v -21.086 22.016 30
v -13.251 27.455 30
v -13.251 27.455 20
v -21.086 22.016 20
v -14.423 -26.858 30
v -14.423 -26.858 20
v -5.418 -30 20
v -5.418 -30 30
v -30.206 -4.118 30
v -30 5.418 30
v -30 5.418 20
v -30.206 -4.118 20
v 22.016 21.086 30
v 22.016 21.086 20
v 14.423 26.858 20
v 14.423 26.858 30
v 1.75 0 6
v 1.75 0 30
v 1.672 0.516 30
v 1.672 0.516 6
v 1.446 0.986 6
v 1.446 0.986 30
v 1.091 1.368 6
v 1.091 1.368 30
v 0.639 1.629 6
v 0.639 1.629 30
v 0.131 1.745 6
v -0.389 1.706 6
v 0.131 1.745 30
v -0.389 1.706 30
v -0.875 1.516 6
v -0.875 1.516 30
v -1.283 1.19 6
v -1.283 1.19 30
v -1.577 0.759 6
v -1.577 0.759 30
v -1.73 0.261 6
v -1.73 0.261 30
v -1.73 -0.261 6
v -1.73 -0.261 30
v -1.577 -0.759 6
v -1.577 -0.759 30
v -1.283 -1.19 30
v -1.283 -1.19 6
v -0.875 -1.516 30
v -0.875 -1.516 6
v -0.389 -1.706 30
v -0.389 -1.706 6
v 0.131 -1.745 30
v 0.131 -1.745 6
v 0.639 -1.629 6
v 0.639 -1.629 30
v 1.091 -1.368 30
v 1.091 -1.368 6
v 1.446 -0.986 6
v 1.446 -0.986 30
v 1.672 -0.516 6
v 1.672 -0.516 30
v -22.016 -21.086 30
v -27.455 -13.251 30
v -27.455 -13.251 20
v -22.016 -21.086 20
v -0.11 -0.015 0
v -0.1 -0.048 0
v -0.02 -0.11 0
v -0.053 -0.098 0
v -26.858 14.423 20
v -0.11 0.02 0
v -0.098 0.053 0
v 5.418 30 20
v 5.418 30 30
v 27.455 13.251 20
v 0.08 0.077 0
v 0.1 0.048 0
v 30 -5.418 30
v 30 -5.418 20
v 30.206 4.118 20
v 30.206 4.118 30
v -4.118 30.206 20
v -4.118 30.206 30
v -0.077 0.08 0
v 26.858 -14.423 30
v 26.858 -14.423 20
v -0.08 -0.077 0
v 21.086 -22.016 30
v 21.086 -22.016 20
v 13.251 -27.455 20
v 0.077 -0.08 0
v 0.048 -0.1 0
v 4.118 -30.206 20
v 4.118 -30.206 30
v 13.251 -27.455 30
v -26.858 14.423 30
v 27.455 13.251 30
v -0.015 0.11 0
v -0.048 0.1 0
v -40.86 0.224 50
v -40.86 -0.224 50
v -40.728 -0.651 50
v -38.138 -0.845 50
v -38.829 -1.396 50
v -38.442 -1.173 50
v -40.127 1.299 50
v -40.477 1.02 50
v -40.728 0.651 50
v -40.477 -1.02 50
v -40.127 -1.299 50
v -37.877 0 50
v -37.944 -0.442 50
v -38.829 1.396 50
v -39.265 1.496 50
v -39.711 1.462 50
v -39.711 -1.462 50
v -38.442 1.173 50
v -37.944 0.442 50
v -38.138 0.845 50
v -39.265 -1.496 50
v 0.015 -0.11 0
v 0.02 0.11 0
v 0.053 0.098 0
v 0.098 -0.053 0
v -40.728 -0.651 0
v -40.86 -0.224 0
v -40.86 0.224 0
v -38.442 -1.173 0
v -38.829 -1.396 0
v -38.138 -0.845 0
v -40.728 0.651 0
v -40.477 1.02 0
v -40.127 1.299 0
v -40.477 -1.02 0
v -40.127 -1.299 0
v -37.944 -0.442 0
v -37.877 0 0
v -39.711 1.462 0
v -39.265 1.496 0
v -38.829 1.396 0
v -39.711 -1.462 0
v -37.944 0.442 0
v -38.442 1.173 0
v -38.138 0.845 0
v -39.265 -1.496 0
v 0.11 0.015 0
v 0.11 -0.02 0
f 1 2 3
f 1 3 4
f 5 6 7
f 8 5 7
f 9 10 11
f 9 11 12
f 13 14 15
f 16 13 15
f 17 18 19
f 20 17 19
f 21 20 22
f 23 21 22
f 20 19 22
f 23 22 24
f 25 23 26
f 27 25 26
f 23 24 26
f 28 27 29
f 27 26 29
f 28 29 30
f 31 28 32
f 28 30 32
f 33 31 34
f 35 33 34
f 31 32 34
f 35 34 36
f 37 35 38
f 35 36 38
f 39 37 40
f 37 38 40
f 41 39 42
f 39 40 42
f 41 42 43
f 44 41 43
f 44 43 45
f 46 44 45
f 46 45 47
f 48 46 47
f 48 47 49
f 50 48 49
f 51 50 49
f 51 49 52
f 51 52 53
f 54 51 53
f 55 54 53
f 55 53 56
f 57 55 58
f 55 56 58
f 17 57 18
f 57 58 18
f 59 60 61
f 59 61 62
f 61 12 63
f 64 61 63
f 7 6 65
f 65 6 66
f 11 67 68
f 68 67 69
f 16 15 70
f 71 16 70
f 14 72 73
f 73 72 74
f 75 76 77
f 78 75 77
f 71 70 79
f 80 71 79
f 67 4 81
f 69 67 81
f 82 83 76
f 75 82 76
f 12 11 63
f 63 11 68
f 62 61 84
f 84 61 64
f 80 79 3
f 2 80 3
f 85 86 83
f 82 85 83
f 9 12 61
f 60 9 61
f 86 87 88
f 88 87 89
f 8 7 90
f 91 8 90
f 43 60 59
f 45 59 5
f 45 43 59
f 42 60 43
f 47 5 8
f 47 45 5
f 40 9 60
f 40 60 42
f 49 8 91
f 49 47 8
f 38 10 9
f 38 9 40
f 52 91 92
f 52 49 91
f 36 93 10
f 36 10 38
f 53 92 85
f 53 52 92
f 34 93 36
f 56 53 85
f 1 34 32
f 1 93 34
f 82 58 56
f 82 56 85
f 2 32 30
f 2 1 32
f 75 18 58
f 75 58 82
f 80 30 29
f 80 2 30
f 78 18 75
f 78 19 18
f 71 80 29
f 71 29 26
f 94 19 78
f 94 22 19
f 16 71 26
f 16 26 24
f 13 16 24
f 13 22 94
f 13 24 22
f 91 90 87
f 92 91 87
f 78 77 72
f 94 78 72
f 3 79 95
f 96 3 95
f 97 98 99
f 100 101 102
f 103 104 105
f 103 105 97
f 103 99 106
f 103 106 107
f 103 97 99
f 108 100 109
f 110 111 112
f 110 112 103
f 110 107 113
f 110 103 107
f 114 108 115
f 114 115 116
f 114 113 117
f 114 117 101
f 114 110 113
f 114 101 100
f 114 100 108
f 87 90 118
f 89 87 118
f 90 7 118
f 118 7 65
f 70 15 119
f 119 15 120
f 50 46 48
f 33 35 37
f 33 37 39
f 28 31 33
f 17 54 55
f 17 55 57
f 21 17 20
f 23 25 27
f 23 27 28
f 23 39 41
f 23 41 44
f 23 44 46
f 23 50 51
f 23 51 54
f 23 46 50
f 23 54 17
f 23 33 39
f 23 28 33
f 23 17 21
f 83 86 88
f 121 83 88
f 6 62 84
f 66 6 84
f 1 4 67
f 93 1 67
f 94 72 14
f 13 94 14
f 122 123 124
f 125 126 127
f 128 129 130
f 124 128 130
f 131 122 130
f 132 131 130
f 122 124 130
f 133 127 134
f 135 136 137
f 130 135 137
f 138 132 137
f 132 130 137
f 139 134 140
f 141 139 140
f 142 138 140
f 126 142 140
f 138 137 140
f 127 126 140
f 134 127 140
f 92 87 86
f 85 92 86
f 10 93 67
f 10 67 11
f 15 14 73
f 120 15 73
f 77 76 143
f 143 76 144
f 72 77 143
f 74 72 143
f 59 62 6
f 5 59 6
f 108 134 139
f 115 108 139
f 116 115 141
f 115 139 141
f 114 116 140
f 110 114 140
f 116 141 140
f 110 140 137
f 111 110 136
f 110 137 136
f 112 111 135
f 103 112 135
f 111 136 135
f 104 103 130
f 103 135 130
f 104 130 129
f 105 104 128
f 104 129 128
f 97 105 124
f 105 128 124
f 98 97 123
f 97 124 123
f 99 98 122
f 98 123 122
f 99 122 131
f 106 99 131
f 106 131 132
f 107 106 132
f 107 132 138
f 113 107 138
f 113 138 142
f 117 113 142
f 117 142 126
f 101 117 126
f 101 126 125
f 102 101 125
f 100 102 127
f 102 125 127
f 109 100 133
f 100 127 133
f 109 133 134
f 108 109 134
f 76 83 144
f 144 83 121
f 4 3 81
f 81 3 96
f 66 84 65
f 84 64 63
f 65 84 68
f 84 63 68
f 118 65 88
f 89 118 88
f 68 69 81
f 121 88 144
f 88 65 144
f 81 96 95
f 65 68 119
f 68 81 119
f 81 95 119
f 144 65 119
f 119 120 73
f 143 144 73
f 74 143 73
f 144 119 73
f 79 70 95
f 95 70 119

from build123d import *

# Parameters (mm, degrees)
F1_DEPTH     = 30
F2_T1_DEPTH  = 273.0855354784
F2_T3_DEPTH  = 273.0855354784
F2_T5_DEPTH  = 273.0855354784
F2_T7_DEPTH  = 273.0855354784
F2_T9_DEPTH  = 273.0855354784
F2_T11_DEPTH = 273.0855354784
F2_T13_DEPTH = 273.0855354784
F2_T15_DEPTH = 273.0855354784
F2_T17_DEPTH = 273.0855354784
F2_T19_DEPTH = 273.0855354784
F2_T21_DEPTH = 273.0855354784
F2_T23_DEPTH = 273.0855354784
F2_T25_DEPTH = 273.0855354784
F2_T27_DEPTH = 273.0855354784
F2_T29_DEPTH = 273.0855354784
F2_T31_DEPTH = 273.0855354784
F2_T33_DEPTH = 273.0855354784
F2_T35_DEPTH = 273.0855354784
F2_T37_DEPTH = 273.0855354784
F2_T39_DEPTH = 273.0855354784
F3_R         = 1.75
F4_DEPTH     = 24
F5_R         = 1.5
F6_DEPTH     = 50


# Not quite as in the source:
# - a fillet or chamfer that OpenCascade refuses, or shapes differently, is made with other operations: its cross-section is extruded or revolved along the edge and cut away or added


with BuildPart() as f1:
    # F0 (on Top) → F1 (new body)
    with BuildSketch(Plane.XY):
        Polygon((13.2507014279, -27.4548412117), (21.0861784508, -22.0164137096), (26.8575934109, -14.4228662363), (30, -5.4175081257), (30.2057975669, 4.1181534262), (27.4548412117, 13.2507014279), (22.0164137096, 21.0861784508), (14.4228662363, 26.8575934109), (5.4175081257, 30), (-4.1181534262, 30.2057975669), (-13.2507014279, 27.4548412117), (-21.0861784508, 22.0164137096), (-26.8575934109, 14.4228662363), (-30, 5.4175081257), (-30.2057975669, -4.1181534262), (-27.4548412117, -13.2507014279), (-22.0164137096, -21.0861784508), (-14.4228662363, -26.8575934109), (-5.4175081257, -30), (4.1181534262, -30.2057975669), align=None)
    extrude(amount=F1_DEPTH)

    # F2: chamfer of 30 x 20 on 20 edges, made by hand

    # F2_s2 → F2_t1 (cut)
    with BuildSketch(Plane(origin=(-128.9192417481, 44.9861815336, 0), x_dir=(0, 0, 1), z_dir=(0.944167486, -0.3294658683, 0))):
        Polygon((20, 30.1099085987), (0, 0.1099085987), (0, 30.1099085987), align=None)
    extrude(amount=F2_T1_DEPTH, mode=Mode.SUBTRACT)

    # F2_s4 → F2_t3 (cut)
    with BuildSketch(Plane(origin=(-136.5109795463, 2.9461644886, 0), x_dir=(0, 0, 1), z_dir=(0.9997671924, -0.0215768622, 0))):
        Polygon((20, 30.1099085987), (0, 0.1099085987), (0, 30.1099085987), align=None)
    extrude(amount=F2_T3_DEPTH, mode=Mode.SUBTRACT)

    # F2_s6 → F2_t5 (cut)
    with BuildSketch(Plane(origin=(-130.7400715385, -39.3822436636, 0), x_dir=(0, 0, 1), z_dir=(0.9575027202, 0.2884242374, 0))):
        Polygon((20, 30.1099085987), (0, 0.1099085987), (0, 30.1099085987), align=None)
    extrude(amount=F2_T5_DEPTH, mode=Mode.SUBTRACT)

    # F2_s8 → F2_t7 (cut)
    with BuildSketch(Plane(origin=(-39.3822436636, 130.7400715385, 0), x_dir=(0, 0, 1), z_dir=(0.2884242374, -0.9575027202, 0))):
        Polygon((20, 30.1099085987), (0, 0.1099085987), (0, 30.1099085987), align=None)
    extrude(amount=F2_T7_DEPTH, mode=Mode.SUBTRACT)

    # F2_s10 → F2_t9 (cut)
    with BuildSketch(Plane(origin=(-77.8556434138, 112.171414409, 0), x_dir=(0, 0, 1), z_dir=(0.5701923632, -0.8215112105, 0))):
        Polygon((20, 30.1099085987), (0, 0.1099085987), (0, 30.1099085987), align=None)
    extrude(amount=F2_T9_DEPTH, mode=Mode.SUBTRACT)

    # F2_s12 → F2_t11 (cut)
    with BuildSketch(Plane(origin=(-108.7079903345, 82.6226376928, 0), x_dir=(0, 0, 1), z_dir=(0.7961460877, -0.6051044597, 0))):
        Polygon((20, 30.1099085987), (0, 0.1099085987), (0, 30.1099085987), align=None)
    extrude(amount=F2_T11_DEPTH, mode=Mode.SUBTRACT)

    # F2_s14 → F2_t13 (cut)
    with BuildSketch(Plane(origin=(-112.171414409, -77.8556434138, 0), x_dir=(0, 0, 1), z_dir=(0.8215112105, 0.5701923632, 0))):
        Polygon((20, 30.1099085987), (0, 0.1099085987), (0, 30.1099085987), align=None)
    extrude(amount=F2_T13_DEPTH, mode=Mode.SUBTRACT)

    # F2_s16 → F2_t15 (cut)
    with BuildSketch(Plane(origin=(-82.6226376928, -108.7079903345, 0), x_dir=(0, 0, 1), z_dir=(0.6051044597, 0.7961460877, 0))):
        Polygon((20, 30.1099085987), (0, 0.1099085987), (0, 30.1099085987), align=None)
    extrude(amount=F2_T15_DEPTH, mode=Mode.SUBTRACT)

    # F2_s18 → F2_t17 (cut)
    with BuildSketch(Plane(origin=(-44.9861815336, -128.9192417481, 0), x_dir=(0, 0, 1), z_dir=(0.3294658683, 0.944167486, 0))):
        Polygon((20, 30.1099085987), (0, 0.1099085987), (0, 30.1099085987), align=None)
    extrude(amount=F2_T17_DEPTH, mode=Mode.SUBTRACT)

    # F2_s20 → F2_t19 (cut)
    with BuildSketch(Plane(origin=(-2.9461644886, -136.5109795463, 0), x_dir=(0, 0, 1), z_dir=(0.0215768622, 0.9997671924, 0))):
        Polygon((20, 30.1099085987), (0, 0.1099085987), (0, 30.1099085987), align=None)
    extrude(amount=F2_T19_DEPTH, mode=Mode.SUBTRACT)

    # F2_s22 → F2_t21 (cut)
    with BuildSketch(Plane(origin=(39.3822436636, -130.7400715385, 0), x_dir=(0, 0, 1), z_dir=(-0.2884242374, 0.9575027202, 0))):
        Polygon((20, 30.1099085987), (0, 0.1099085987), (0, 30.1099085987), align=None)
    extrude(amount=F2_T21_DEPTH, mode=Mode.SUBTRACT)

    # F2_s24 → F2_t23 (cut)
    with BuildSketch(Plane(origin=(77.8556434138, -112.171414409, 0), x_dir=(0, 0, 1), z_dir=(-0.5701923632, 0.8215112105, 0))):
        Polygon((20, 30.1099085987), (0, 0.1099085987), (0, 30.1099085987), align=None)
    extrude(amount=F2_T23_DEPTH, mode=Mode.SUBTRACT)

    # F2_s26 → F2_t25 (cut)
    with BuildSketch(Plane(origin=(108.7079903345, -82.6226376928, 0), x_dir=(0, 0, 1), z_dir=(-0.7961460877, 0.6051044597, 0))):
        Polygon((20, 30.1099085987), (0, 0.1099085987), (0, 30.1099085987), align=None)
    extrude(amount=F2_T25_DEPTH, mode=Mode.SUBTRACT)

    # F2_s28 → F2_t27 (cut)
    with BuildSketch(Plane(origin=(128.9192417481, -44.9861815336, 0), x_dir=(0, 0, 1), z_dir=(-0.944167486, 0.3294658683, 0))):
        Polygon((20, 30.1099085987), (0, 0.1099085987), (0, 30.1099085987), align=None)
    extrude(amount=F2_T27_DEPTH, mode=Mode.SUBTRACT)

    # F2_s30 → F2_t29 (cut)
    with BuildSketch(Plane(origin=(136.5109795463, -2.9461644886, 0), x_dir=(0, 0, 1), z_dir=(-0.9997671924, 0.0215768622, 0))):
        Polygon((20, 30.1099085987), (0, 0.1099085987), (0, 30.1099085987), align=None)
    extrude(amount=F2_T29_DEPTH, mode=Mode.SUBTRACT)

    # F2_s32 → F2_t31 (cut)
    with BuildSketch(Plane(origin=(130.7400715385, 39.3822436636, 0), x_dir=(0, 0, 1), z_dir=(-0.9575027202, -0.2884242374, 0))):
        Polygon((20, 30.1099085987), (0, 0.1099085987), (0, 30.1099085987), align=None)
    extrude(amount=F2_T31_DEPTH, mode=Mode.SUBTRACT)

    # F2_s34 → F2_t33 (cut)
    with BuildSketch(Plane(origin=(112.171414409, 77.8556434138, 0), x_dir=(0, 0, 1), z_dir=(-0.8215112105, -0.5701923632, 0))):
        Polygon((20, 30.1099085987), (0, 0.1099085987), (0, 30.1099085987), align=None)
    extrude(amount=F2_T33_DEPTH, mode=Mode.SUBTRACT)

    # F2_s36 → F2_t35 (cut)
    with BuildSketch(Plane(origin=(82.6226376928, 108.7079903345, 0), x_dir=(0, 0, 1), z_dir=(-0.6051044597, -0.7961460877, 0))):
        Polygon((20, 30.1099085987), (0, 0.1099085987), (0, 30.1099085987), align=None)
    extrude(amount=F2_T35_DEPTH, mode=Mode.SUBTRACT)

    # F2_s38 → F2_t37 (cut)
    with BuildSketch(Plane(origin=(44.9861815336, 128.9192417481, 0), x_dir=(0, 0, 1), z_dir=(-0.3294658683, -0.944167486, 0))):
        Polygon((20, 30.1099085987), (0, 0.1099085987), (0, 30.1099085987), align=None)
    extrude(amount=F2_T37_DEPTH, mode=Mode.SUBTRACT)

    # F2_s40 → F2_t39 (cut)
    with BuildSketch(Plane(origin=(2.9461644886, 136.5109795463, 0), x_dir=(0, 0, 1), z_dir=(-0.0215768622, -0.9997671924, 0))):
        Polygon((20, 30.1099085987), (0, 0.1099085987), (0, 30.1099085987), align=None)
    extrude(amount=F2_T39_DEPTH, mode=Mode.SUBTRACT)

    # F3 (on face) → F4 (cut)
    with BuildSketch(Plane.XY.offset(30)):
        Circle(F3_R)
    extrude(amount=-F4_DEPTH, mode=Mode.SUBTRACT)


with BuildPart() as f6:
    # F5 (on Top) → F6 (new body)
    with BuildSketch(Plane.XY):
        with Locations((-39.3769755578, 0)):
            Circle(F5_R)
    extrude(amount=F6_DEPTH)


solid = Compound([f1.part, f6.part])
